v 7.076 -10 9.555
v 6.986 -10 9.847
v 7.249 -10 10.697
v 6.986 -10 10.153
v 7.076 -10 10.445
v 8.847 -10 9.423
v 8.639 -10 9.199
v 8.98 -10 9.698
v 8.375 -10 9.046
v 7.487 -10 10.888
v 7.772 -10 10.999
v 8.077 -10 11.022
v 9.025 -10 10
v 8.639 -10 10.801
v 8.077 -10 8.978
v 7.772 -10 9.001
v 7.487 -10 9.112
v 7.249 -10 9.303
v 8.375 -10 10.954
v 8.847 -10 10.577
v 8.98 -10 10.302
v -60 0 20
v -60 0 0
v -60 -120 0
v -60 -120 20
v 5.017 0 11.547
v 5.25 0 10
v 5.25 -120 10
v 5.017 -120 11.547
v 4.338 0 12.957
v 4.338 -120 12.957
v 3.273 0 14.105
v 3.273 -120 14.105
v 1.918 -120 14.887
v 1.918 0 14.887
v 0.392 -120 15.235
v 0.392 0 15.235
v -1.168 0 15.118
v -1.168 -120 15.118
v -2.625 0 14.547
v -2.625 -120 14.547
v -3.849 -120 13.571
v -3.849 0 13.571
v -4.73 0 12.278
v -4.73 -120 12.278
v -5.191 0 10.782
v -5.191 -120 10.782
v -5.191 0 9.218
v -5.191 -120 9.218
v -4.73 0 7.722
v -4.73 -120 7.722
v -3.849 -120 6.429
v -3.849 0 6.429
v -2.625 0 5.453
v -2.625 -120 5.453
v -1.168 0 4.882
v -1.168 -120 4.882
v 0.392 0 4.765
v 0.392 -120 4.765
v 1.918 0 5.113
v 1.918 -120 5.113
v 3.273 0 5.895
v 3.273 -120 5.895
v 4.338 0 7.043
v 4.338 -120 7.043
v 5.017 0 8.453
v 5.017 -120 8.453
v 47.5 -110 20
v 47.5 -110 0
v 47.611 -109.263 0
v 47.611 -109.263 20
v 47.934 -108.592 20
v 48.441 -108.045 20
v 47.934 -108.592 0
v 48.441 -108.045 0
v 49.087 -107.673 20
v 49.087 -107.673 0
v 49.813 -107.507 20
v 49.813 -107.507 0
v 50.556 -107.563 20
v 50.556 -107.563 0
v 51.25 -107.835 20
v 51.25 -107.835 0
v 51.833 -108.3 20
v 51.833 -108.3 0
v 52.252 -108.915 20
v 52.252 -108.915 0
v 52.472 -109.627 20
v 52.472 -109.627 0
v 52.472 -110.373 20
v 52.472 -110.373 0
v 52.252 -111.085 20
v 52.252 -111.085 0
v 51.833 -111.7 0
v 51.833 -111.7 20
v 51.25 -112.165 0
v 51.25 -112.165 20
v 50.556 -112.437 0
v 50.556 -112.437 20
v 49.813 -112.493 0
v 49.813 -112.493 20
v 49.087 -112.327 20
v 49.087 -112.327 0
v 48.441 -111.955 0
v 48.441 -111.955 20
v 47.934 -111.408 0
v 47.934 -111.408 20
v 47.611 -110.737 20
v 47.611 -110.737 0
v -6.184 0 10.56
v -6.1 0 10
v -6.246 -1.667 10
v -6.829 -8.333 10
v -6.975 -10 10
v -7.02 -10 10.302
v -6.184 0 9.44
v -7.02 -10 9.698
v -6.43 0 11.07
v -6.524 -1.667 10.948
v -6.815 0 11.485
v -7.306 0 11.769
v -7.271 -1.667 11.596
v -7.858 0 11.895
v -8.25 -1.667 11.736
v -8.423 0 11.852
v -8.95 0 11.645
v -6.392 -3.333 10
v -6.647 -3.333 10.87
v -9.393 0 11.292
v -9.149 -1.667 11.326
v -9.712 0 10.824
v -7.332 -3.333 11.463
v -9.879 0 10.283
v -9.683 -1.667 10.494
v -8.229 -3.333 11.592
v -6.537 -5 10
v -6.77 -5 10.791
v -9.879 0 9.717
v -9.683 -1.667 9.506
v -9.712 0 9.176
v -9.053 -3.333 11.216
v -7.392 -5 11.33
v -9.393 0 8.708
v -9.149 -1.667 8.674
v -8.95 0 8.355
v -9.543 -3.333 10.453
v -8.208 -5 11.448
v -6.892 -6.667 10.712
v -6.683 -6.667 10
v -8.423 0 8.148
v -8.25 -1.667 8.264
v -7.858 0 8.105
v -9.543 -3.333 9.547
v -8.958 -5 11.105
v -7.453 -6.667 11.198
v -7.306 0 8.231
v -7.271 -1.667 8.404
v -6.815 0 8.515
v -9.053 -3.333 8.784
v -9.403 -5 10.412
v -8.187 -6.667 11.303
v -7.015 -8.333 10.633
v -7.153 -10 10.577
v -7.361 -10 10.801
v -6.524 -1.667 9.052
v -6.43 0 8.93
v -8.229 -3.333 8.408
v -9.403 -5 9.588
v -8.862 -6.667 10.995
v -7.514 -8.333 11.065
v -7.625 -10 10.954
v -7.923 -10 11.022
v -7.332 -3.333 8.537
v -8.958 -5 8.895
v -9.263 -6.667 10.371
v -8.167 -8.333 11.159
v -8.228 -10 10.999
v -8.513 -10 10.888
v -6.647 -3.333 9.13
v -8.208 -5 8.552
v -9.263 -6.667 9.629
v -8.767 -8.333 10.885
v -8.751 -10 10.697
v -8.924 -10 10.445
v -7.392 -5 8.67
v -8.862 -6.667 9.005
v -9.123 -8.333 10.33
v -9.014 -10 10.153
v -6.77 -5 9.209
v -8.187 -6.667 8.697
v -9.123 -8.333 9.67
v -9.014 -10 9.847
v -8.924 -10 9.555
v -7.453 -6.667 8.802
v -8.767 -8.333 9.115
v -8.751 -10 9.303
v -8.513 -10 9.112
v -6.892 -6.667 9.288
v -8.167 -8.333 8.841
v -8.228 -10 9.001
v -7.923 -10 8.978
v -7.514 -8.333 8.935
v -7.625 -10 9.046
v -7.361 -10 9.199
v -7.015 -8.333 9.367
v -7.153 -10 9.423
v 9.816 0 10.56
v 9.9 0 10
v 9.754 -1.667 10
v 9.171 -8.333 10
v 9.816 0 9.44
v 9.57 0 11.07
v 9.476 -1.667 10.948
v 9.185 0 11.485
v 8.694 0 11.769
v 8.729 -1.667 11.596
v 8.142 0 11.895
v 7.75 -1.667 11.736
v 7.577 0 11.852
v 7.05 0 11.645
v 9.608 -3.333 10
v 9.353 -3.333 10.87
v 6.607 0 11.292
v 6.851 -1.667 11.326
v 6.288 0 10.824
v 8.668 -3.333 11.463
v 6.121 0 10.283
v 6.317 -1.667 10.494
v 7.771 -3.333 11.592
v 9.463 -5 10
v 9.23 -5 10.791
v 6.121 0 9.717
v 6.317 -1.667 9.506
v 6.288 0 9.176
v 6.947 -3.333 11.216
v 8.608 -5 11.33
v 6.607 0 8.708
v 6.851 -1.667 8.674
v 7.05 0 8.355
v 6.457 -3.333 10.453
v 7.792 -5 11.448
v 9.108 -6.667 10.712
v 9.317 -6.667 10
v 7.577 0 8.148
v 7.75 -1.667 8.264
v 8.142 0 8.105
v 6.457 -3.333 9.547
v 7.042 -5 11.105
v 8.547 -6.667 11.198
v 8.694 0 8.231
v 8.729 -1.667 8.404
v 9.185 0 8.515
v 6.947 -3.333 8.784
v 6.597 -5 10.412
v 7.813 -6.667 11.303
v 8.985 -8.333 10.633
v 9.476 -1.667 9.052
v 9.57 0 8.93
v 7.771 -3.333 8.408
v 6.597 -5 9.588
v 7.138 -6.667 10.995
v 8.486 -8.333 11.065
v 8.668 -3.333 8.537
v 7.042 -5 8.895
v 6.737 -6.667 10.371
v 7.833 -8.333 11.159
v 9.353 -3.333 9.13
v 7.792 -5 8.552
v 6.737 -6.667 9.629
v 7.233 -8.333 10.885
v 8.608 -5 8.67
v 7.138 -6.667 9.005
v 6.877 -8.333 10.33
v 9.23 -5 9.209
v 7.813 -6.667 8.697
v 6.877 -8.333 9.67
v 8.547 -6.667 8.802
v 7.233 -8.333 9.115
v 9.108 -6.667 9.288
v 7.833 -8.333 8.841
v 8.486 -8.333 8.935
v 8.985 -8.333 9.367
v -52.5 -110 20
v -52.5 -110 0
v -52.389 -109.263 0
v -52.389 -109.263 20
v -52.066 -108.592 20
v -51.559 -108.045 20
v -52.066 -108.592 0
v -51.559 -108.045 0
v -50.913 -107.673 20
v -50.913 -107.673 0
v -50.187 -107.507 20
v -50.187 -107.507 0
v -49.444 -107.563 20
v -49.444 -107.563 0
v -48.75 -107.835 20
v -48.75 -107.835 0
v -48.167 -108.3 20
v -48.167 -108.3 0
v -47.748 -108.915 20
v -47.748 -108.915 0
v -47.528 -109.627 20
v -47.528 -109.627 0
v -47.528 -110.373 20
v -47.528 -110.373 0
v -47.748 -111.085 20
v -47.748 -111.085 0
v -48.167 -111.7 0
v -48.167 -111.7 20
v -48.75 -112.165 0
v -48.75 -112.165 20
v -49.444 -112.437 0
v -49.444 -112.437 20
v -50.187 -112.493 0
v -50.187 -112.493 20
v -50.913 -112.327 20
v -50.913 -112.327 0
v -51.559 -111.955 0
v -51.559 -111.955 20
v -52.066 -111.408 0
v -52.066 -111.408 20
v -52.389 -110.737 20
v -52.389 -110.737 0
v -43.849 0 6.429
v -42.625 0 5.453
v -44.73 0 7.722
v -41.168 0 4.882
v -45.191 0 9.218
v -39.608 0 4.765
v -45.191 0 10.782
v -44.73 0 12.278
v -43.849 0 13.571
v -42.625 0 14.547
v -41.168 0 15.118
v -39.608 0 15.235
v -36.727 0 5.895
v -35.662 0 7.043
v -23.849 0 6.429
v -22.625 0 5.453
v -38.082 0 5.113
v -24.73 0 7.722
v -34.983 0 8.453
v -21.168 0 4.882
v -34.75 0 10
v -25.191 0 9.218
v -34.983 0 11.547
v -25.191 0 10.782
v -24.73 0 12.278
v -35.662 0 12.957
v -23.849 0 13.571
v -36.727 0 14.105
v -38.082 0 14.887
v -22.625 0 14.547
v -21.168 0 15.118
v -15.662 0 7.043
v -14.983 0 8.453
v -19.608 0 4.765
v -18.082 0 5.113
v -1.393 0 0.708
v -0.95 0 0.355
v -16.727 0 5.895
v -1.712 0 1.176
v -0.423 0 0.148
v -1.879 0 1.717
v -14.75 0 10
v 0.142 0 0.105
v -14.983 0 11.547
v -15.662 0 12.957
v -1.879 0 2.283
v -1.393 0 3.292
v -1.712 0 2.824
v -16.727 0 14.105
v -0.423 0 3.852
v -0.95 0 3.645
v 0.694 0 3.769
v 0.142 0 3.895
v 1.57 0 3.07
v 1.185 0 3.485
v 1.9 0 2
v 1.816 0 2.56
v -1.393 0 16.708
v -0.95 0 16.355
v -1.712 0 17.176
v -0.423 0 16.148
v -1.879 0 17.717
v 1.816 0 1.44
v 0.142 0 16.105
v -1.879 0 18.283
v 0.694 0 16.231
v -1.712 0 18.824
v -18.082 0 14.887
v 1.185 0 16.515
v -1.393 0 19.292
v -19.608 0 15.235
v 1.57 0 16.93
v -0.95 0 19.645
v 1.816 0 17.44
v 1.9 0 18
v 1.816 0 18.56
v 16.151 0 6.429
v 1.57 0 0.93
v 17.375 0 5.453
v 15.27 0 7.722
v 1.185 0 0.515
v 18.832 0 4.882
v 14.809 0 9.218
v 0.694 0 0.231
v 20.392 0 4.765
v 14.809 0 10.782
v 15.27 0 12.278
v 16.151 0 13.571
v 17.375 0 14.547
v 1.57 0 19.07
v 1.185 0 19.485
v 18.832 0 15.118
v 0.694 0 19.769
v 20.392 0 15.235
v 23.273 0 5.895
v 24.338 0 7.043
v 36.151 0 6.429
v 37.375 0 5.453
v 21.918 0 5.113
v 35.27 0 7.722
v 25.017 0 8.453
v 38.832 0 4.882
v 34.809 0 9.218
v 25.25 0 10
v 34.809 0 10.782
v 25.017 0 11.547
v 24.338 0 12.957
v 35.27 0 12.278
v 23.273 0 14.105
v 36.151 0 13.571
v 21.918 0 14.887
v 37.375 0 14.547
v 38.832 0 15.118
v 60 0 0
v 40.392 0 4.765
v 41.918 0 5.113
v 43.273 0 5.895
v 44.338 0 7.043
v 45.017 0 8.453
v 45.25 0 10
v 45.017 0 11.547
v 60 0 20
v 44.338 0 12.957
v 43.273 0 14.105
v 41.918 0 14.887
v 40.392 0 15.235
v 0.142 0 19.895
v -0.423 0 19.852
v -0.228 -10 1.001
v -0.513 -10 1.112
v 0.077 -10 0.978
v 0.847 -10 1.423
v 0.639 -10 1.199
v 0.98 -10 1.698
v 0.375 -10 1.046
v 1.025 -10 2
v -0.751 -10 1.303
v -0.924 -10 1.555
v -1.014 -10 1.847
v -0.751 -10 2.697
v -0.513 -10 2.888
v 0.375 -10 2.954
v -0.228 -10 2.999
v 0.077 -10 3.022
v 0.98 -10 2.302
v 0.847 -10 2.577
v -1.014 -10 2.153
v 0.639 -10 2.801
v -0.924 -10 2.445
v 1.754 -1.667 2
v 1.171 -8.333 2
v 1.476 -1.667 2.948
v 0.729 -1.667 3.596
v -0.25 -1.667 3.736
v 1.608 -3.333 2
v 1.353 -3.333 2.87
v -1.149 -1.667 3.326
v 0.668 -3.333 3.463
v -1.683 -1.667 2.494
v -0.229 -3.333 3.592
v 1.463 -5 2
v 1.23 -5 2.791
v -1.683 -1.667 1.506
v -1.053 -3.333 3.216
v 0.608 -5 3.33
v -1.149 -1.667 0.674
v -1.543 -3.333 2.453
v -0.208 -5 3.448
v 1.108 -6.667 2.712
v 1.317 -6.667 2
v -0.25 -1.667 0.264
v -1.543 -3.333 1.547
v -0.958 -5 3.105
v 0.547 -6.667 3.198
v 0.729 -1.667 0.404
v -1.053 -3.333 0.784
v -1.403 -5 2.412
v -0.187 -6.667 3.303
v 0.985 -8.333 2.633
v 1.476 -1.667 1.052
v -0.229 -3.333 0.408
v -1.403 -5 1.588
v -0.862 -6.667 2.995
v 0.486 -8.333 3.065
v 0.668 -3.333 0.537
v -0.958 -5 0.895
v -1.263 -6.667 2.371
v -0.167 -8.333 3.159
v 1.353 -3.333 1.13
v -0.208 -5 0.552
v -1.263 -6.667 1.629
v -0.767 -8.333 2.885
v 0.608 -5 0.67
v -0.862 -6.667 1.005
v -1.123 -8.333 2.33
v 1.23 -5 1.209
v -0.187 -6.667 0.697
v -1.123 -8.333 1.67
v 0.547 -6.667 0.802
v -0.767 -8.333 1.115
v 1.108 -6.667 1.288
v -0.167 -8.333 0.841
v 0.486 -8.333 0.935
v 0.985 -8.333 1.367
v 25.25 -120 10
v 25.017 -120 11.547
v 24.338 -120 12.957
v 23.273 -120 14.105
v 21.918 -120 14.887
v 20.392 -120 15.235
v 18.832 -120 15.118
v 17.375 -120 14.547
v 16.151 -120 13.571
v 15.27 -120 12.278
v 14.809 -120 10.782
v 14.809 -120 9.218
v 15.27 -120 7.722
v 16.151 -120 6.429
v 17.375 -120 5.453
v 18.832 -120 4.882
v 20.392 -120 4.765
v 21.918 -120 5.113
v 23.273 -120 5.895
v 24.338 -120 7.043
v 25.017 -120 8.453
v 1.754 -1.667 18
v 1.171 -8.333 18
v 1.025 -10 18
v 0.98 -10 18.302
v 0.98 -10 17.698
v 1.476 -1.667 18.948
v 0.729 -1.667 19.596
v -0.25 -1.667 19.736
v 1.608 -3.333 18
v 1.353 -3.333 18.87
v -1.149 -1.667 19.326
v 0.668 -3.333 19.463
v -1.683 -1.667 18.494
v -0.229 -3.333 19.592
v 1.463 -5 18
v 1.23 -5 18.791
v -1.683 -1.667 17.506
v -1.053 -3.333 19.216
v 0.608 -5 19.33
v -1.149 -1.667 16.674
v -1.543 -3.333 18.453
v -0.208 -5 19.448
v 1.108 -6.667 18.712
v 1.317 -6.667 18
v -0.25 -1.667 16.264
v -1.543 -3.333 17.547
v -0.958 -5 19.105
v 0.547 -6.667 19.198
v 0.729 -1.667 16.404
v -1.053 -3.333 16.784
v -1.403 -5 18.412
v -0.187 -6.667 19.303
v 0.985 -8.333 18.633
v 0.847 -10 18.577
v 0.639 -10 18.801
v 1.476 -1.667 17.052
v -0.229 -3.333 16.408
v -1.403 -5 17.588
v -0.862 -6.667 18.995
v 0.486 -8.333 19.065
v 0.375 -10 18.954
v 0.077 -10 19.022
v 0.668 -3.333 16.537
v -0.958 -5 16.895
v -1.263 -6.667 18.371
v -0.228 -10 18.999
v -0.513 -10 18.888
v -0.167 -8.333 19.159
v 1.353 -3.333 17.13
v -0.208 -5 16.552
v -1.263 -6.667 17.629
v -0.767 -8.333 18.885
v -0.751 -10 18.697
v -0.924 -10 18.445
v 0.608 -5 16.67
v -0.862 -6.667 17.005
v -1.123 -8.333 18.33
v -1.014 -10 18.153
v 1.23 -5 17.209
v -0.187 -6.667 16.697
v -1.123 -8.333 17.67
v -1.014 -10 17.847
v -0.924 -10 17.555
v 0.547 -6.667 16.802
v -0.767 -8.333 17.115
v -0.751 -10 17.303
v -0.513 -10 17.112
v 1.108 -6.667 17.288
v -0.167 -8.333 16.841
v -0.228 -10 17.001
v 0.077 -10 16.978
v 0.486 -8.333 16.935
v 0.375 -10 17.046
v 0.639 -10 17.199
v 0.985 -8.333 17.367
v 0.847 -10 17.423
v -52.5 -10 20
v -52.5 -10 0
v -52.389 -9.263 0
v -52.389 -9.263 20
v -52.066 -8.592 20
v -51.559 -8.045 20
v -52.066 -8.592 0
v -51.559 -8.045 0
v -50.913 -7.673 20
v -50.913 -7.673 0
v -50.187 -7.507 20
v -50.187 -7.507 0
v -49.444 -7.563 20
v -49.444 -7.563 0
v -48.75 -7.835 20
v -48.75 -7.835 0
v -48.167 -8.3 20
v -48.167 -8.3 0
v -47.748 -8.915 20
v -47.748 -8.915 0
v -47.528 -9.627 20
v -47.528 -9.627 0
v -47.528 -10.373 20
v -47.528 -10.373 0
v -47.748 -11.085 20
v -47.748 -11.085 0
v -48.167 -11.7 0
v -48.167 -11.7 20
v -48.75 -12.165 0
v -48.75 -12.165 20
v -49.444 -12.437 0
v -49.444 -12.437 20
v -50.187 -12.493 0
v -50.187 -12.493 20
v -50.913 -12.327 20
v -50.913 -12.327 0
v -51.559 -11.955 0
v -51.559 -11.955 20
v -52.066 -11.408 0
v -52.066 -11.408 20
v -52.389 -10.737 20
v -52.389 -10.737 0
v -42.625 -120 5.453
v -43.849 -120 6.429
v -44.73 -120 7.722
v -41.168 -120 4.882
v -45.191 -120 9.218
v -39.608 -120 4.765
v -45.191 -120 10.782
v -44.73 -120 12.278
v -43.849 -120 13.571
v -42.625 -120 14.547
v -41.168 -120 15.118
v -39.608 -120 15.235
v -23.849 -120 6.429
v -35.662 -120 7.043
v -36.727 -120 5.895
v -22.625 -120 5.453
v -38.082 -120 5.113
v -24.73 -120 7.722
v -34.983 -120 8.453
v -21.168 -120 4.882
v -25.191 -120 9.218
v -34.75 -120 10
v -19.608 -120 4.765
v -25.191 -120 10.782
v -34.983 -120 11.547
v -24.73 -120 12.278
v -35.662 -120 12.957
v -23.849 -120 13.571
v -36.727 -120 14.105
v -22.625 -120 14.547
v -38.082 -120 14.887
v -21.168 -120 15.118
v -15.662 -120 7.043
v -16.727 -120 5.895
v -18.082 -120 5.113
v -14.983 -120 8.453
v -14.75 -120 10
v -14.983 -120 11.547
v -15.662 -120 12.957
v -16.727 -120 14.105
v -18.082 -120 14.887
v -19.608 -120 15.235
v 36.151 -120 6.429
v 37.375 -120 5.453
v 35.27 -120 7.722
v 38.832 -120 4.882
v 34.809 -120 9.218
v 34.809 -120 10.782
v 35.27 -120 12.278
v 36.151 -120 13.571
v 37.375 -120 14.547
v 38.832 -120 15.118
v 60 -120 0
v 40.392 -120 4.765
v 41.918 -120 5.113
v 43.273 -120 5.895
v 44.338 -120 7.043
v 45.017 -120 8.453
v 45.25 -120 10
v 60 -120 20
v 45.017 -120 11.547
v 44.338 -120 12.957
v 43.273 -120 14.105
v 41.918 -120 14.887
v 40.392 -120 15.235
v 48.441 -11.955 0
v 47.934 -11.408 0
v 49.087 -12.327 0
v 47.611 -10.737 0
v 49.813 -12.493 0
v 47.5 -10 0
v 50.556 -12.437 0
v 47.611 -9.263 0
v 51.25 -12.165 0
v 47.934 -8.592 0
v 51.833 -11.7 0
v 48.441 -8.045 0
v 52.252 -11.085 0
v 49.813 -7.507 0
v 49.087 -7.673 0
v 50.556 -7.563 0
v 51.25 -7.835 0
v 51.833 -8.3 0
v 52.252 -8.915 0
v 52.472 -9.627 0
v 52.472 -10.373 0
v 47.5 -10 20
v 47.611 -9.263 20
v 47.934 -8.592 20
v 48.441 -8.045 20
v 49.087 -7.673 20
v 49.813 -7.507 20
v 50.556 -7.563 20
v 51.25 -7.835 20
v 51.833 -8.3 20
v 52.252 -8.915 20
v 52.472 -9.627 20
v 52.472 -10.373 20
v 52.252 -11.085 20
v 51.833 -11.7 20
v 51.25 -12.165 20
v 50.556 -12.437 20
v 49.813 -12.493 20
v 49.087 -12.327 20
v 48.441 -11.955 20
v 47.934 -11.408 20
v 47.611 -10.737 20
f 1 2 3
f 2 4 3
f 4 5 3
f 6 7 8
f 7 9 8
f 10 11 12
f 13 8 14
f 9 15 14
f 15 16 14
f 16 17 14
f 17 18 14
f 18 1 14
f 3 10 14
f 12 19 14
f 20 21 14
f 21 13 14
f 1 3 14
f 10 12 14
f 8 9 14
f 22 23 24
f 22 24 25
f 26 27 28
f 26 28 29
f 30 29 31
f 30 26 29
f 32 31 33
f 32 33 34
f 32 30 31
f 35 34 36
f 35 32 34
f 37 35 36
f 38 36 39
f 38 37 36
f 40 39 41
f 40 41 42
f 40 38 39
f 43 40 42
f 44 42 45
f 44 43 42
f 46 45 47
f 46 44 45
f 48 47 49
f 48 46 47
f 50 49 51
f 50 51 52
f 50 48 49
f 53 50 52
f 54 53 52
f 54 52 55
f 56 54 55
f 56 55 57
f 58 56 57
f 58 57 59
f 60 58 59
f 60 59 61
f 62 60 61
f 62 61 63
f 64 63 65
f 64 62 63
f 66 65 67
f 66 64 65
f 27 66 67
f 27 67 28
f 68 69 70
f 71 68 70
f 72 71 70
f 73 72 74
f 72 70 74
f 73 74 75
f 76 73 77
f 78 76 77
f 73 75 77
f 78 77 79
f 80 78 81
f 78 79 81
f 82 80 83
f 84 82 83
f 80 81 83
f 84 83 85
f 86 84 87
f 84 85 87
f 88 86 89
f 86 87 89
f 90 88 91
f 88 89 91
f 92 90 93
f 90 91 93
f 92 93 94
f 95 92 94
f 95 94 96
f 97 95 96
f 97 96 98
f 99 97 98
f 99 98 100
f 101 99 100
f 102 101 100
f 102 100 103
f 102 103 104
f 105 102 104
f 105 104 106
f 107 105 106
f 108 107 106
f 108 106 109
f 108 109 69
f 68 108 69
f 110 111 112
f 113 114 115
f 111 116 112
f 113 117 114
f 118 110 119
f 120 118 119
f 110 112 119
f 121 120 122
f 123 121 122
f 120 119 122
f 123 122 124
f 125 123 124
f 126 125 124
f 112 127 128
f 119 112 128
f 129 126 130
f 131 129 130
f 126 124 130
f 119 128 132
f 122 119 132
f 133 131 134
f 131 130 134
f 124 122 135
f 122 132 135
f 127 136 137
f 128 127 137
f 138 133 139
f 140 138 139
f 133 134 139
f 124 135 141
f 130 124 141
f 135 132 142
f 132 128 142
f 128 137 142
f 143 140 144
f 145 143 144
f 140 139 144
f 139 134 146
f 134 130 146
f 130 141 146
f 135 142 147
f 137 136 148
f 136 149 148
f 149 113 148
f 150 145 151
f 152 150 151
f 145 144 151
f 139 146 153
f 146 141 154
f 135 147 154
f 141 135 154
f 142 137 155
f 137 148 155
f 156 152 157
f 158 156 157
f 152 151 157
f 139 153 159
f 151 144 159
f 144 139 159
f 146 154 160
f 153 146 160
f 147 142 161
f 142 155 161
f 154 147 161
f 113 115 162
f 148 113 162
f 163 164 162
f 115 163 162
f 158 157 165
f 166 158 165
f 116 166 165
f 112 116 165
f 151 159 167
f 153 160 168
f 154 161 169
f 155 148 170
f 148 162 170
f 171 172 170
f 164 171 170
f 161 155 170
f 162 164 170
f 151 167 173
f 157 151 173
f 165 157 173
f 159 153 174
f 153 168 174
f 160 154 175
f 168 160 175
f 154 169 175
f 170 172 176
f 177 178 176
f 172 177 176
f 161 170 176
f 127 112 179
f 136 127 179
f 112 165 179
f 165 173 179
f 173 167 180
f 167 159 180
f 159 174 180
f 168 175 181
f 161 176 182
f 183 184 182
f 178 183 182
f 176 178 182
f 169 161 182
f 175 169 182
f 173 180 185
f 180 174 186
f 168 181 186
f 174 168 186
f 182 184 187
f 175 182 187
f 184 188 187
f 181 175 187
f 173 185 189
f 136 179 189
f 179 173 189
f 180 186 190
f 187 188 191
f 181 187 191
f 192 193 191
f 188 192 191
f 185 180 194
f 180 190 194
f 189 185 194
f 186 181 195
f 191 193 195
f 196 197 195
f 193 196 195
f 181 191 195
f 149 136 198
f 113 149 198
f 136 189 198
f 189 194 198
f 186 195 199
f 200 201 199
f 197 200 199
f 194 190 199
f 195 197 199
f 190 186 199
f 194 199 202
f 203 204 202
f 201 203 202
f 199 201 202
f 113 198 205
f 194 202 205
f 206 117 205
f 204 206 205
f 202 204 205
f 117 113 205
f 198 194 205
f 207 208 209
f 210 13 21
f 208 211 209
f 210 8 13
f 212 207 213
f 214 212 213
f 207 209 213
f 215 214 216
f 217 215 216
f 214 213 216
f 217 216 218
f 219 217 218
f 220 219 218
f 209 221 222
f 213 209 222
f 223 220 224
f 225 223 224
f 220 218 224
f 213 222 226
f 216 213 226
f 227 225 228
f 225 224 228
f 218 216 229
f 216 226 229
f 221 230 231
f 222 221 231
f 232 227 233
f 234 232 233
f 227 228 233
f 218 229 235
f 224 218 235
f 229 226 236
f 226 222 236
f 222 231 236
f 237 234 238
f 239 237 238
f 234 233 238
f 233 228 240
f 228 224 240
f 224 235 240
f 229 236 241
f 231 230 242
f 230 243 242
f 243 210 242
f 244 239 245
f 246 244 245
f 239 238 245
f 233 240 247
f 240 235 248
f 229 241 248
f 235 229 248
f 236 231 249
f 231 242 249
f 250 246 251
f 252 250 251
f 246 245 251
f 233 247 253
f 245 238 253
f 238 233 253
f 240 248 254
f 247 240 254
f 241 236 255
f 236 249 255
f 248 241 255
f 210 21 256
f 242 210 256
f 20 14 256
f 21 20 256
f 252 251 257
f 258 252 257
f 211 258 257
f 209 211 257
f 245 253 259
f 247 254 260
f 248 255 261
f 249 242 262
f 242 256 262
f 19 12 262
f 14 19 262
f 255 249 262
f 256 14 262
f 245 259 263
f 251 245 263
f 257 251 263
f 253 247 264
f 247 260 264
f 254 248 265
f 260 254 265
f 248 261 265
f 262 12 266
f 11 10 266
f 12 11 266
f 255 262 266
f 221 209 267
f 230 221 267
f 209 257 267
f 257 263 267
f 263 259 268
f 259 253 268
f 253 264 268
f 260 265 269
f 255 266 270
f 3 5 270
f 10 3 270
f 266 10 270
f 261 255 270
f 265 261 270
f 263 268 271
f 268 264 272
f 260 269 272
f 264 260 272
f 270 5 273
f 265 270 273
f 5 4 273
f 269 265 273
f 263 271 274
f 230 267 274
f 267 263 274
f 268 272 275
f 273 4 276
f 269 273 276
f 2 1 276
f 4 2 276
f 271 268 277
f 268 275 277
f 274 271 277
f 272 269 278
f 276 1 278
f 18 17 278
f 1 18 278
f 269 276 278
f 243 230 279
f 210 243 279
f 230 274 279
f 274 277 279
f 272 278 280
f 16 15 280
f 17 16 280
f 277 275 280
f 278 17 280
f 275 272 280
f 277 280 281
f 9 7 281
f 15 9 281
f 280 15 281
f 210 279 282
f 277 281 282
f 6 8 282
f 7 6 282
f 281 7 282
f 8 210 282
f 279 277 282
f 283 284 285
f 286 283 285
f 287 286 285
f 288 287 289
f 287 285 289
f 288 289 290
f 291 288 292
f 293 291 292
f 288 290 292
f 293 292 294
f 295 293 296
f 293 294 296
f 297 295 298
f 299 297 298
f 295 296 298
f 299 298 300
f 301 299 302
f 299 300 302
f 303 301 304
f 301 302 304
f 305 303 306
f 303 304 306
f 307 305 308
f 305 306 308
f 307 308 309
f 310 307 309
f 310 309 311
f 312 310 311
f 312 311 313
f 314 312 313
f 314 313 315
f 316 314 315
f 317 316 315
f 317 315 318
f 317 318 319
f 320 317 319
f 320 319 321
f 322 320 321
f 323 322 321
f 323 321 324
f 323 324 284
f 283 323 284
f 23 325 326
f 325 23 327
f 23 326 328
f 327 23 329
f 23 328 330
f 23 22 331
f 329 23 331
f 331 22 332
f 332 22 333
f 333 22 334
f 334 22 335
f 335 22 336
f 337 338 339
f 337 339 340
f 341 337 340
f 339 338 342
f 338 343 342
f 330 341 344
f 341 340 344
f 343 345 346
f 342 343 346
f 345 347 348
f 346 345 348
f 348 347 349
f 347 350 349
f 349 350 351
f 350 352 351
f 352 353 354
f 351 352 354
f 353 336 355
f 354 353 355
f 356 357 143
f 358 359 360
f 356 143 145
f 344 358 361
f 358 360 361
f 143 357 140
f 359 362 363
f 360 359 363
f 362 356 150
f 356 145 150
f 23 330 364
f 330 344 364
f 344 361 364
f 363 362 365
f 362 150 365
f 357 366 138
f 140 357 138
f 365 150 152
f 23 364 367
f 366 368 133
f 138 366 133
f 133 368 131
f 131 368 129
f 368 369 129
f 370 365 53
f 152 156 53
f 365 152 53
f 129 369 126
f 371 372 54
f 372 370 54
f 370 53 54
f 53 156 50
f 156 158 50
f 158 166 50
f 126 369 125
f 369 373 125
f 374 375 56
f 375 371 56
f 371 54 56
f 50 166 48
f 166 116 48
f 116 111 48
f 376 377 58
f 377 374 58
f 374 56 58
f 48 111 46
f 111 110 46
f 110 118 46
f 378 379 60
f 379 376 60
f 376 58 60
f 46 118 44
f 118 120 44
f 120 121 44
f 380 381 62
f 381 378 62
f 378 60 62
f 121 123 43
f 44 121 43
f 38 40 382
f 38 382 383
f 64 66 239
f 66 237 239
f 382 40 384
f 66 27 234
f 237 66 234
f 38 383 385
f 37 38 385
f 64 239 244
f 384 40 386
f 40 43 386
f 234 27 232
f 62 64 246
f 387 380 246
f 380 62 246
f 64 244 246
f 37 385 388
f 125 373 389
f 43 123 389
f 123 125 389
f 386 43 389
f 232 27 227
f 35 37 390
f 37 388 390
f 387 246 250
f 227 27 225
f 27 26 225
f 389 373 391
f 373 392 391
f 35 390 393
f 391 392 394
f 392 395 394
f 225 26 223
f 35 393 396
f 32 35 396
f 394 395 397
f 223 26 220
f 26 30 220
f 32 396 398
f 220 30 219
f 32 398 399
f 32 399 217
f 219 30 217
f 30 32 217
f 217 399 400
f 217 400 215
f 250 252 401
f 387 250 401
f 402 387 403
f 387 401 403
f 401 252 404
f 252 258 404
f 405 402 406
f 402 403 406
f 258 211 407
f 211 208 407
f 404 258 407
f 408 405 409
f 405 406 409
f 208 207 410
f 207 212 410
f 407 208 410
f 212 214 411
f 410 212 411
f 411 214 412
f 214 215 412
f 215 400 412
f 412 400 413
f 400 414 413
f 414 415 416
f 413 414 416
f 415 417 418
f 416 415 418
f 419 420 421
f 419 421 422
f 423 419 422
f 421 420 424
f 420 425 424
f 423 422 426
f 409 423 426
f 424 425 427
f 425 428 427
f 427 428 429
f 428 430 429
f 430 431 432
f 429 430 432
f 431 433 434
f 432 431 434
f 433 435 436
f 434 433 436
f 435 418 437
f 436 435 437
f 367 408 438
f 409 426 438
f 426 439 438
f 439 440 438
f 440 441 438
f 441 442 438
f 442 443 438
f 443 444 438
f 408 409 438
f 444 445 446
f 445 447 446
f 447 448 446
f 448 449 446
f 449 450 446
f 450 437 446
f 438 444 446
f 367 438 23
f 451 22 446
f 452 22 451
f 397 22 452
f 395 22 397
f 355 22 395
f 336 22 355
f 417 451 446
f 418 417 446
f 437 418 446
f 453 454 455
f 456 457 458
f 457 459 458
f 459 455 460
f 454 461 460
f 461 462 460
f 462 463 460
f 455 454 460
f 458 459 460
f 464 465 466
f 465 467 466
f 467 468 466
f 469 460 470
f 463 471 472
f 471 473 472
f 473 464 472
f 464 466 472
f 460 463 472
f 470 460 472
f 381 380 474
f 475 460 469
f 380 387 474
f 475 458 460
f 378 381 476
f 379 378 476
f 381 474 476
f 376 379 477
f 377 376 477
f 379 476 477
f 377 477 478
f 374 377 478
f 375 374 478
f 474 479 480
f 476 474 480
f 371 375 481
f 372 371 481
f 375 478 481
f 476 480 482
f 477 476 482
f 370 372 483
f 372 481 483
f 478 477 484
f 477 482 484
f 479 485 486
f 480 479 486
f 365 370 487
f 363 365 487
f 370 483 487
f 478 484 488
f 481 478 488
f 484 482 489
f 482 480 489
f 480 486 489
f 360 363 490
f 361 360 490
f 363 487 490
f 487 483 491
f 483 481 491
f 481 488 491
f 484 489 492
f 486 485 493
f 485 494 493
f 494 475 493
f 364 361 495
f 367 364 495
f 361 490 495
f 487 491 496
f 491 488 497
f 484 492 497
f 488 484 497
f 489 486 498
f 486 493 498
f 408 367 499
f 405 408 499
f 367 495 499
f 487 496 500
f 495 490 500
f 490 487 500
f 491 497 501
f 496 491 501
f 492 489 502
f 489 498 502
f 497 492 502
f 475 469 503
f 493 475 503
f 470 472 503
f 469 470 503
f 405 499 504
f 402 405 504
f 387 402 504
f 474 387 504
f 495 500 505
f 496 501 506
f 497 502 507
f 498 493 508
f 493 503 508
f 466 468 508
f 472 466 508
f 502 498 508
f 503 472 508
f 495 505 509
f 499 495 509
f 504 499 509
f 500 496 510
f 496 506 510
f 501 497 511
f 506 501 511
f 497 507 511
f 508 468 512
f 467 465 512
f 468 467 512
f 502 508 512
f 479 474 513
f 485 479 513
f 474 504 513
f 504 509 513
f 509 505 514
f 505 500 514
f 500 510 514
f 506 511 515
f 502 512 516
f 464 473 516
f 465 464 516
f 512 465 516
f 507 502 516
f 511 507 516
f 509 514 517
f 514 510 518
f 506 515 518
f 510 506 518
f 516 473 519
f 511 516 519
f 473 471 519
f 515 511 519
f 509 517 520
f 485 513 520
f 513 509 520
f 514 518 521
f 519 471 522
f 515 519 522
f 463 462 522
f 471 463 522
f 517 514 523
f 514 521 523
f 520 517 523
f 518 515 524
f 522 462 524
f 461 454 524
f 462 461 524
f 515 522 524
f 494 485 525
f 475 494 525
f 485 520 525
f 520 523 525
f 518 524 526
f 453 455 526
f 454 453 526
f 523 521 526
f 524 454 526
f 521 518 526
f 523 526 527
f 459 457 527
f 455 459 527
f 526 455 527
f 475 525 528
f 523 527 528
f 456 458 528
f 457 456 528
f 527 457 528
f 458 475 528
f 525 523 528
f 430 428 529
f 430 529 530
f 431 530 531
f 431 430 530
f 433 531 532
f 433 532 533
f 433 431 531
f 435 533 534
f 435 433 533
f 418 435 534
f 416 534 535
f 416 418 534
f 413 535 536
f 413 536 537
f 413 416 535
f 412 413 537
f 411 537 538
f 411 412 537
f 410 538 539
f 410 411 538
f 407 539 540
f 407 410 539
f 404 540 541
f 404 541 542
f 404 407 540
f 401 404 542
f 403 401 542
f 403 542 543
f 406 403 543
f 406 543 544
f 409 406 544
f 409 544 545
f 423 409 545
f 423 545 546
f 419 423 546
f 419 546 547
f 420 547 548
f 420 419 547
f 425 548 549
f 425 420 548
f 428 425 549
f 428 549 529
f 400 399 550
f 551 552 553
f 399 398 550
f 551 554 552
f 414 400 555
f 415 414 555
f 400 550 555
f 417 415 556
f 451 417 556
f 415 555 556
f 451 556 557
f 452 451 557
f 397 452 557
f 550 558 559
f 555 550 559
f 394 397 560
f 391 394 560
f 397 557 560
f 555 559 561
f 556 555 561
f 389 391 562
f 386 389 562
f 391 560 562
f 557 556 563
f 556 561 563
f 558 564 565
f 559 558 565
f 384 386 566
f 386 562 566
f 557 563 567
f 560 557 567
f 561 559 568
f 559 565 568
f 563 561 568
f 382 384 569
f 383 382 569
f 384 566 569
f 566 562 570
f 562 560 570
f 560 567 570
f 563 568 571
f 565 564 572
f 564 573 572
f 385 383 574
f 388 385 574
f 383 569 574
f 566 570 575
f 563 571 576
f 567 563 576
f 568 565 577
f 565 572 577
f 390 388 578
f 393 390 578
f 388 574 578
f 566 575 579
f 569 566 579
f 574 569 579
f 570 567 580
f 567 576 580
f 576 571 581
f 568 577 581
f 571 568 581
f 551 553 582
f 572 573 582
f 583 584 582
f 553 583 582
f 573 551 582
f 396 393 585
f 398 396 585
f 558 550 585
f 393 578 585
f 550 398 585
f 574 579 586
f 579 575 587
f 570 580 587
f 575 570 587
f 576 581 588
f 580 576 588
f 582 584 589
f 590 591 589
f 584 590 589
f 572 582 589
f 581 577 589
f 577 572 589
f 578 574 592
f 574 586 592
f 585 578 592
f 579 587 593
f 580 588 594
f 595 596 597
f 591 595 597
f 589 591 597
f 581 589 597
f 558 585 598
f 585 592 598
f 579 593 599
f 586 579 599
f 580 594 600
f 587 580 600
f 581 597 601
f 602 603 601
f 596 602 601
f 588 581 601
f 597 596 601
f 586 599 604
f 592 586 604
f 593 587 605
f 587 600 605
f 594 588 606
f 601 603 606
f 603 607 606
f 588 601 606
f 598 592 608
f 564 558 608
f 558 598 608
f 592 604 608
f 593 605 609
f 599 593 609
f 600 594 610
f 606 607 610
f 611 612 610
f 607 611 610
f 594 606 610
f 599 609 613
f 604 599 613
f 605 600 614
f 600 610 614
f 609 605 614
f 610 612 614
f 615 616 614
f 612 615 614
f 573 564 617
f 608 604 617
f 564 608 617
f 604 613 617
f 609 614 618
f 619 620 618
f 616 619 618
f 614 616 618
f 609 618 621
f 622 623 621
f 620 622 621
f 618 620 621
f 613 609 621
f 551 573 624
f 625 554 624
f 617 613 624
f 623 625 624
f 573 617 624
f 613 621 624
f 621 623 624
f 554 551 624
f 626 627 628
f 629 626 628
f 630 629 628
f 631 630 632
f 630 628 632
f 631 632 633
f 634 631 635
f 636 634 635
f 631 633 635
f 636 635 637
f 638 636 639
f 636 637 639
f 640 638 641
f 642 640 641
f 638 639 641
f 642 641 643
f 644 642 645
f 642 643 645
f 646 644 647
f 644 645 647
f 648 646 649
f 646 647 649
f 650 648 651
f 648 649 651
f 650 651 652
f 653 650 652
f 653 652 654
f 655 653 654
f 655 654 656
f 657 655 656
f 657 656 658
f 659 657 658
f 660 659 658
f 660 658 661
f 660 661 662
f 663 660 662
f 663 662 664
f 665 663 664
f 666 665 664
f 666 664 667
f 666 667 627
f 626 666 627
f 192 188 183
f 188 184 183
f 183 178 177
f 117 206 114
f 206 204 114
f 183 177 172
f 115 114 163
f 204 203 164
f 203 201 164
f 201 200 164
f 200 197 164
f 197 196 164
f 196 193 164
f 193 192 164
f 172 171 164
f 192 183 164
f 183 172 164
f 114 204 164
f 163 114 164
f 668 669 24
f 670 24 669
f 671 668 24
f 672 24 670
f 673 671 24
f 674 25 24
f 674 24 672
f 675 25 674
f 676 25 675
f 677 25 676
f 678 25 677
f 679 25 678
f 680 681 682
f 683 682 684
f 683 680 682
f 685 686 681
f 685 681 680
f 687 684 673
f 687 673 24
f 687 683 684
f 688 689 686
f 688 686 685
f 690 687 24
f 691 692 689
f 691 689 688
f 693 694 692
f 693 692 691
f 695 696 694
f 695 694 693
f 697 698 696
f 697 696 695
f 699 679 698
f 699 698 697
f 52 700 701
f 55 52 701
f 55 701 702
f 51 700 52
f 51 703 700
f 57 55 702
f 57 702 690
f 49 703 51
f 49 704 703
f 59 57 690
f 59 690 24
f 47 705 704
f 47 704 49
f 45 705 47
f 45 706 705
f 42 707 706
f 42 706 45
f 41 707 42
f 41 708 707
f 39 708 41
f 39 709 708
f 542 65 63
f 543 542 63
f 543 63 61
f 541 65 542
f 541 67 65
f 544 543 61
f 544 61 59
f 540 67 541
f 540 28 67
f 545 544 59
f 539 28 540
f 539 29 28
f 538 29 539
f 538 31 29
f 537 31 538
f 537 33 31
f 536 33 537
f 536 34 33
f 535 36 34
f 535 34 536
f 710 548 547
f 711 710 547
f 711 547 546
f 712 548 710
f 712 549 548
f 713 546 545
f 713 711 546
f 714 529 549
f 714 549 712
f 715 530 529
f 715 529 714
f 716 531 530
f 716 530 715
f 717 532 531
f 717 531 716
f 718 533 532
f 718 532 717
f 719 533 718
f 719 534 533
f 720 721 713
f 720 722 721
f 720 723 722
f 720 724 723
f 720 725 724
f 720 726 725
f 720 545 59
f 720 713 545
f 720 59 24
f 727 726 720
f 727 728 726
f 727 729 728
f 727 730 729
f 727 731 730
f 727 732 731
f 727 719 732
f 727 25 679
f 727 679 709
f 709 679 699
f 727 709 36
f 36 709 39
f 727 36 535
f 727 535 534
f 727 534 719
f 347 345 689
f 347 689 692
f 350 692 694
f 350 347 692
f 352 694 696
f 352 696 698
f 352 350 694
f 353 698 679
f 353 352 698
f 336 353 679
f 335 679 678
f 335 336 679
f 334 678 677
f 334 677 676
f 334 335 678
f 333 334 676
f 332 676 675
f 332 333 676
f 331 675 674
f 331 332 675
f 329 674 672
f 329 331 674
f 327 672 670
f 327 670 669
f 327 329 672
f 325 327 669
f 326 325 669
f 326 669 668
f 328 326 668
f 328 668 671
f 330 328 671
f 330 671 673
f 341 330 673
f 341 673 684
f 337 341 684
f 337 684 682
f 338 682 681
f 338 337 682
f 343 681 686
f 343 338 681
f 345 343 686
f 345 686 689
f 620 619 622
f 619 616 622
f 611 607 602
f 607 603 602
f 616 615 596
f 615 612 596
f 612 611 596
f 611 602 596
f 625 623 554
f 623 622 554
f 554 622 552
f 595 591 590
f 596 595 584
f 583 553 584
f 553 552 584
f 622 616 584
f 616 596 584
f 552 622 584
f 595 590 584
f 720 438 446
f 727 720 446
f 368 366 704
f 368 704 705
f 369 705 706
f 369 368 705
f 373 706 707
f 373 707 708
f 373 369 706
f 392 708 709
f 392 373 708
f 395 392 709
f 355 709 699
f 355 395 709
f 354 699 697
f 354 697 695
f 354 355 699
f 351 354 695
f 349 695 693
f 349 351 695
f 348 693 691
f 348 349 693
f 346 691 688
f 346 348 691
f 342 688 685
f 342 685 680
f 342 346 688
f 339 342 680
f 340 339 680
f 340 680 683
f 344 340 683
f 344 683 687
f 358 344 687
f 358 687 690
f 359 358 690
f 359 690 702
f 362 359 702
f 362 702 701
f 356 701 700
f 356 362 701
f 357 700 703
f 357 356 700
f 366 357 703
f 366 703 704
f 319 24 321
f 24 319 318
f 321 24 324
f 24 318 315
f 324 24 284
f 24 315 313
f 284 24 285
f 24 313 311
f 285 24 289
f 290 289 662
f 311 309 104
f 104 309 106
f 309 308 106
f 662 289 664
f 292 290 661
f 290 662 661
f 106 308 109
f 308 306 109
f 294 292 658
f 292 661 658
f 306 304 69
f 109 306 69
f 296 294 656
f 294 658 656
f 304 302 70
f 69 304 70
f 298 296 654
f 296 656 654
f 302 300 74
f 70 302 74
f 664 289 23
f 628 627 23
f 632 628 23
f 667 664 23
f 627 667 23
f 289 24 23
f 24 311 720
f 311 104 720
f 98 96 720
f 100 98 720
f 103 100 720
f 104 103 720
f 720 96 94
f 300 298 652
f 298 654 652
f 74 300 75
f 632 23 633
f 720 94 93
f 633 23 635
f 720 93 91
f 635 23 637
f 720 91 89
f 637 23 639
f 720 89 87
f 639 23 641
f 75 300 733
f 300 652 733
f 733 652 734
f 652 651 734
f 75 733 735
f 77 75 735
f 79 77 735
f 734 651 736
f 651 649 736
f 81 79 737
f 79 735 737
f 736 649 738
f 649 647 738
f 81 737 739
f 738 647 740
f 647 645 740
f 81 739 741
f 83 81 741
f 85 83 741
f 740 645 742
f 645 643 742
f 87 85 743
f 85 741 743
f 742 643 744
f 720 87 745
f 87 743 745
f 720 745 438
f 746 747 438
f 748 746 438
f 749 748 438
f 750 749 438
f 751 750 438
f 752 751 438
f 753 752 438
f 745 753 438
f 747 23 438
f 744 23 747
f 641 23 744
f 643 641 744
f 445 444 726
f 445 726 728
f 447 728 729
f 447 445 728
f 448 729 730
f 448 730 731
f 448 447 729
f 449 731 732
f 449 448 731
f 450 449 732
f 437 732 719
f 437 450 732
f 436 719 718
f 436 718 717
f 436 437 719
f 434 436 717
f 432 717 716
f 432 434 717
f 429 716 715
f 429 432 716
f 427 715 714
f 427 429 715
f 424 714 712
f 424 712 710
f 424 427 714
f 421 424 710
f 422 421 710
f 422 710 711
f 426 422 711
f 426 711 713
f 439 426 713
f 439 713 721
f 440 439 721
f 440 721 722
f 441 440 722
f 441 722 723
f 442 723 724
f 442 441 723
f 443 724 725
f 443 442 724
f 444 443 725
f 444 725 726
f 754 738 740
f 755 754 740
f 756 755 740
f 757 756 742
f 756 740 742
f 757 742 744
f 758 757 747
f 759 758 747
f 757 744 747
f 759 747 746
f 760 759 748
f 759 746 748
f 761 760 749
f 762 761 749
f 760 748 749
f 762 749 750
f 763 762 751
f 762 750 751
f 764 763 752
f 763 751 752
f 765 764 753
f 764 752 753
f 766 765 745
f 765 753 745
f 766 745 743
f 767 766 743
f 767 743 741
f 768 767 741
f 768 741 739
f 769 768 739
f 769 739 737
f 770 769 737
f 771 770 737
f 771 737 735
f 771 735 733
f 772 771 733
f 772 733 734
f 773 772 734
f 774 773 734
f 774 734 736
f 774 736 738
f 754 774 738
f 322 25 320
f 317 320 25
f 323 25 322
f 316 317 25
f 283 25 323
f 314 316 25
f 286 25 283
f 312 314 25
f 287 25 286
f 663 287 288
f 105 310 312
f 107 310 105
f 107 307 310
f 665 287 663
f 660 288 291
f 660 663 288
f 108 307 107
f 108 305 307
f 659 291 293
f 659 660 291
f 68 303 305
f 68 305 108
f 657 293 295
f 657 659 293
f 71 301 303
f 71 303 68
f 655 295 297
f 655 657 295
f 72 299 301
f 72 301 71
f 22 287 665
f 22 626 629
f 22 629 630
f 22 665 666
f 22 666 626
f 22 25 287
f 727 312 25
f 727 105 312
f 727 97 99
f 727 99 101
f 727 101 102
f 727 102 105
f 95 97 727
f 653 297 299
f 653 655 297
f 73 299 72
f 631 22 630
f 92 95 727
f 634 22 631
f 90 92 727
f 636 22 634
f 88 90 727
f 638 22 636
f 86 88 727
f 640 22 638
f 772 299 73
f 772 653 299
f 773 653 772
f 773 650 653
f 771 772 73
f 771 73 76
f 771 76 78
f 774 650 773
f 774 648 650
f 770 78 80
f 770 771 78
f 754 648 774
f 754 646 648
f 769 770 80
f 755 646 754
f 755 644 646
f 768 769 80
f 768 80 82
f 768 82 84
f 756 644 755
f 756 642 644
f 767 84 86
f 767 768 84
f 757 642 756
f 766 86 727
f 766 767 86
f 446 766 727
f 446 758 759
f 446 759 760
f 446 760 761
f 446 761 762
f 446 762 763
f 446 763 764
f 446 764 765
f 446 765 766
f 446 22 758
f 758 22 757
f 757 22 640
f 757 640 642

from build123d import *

# Parameters (mm, degrees)
F0_W     = 120
F0_H     = 20
F0_R     = 1.9
F0_R_2   = 5.25
F1_DEPTH = 120
F3_D     = 5
F4_DEPTH = 10
F4_TAPER = 5


with BuildPart() as f1:
    # F0 (on Front) → F1 (new body)
    with BuildSketch(Plane.XZ):
        with Locations((0, 10)):
            Rectangle(F0_W, F0_H)
        with Locations((0, 2)):
            Circle(F0_R, mode=Mode.SUBTRACT)
        with Locations((-40, 10)):
            Circle(F0_R_2, mode=Mode.SUBTRACT)
        with Locations((-20, 10)):
            Circle(F0_R_2, mode=Mode.SUBTRACT)
        with Locations((-8, 10)):
            Circle(F0_R, mode=Mode.SUBTRACT)
        with Locations((0, 10)):
            Circle(F0_R_2, mode=Mode.SUBTRACT)
        with Locations((8, 10)):
            Circle(F0_R, mode=Mode.SUBTRACT)
        with Locations((20, 10)):
            Circle(F0_R_2, mode=Mode.SUBTRACT)
        with Locations((40, 10)):
            Circle(F0_R_2, mode=Mode.SUBTRACT)
        with Locations((0, 18)):
            Circle(F0_R, mode=Mode.SUBTRACT)
        with Locations((8, 10)):
            Circle(F0_R)
        with Locations((0, 18)):
            Circle(F0_R)
        with Locations((-8, 10)):
            Circle(F0_R)
        with Locations((0, 2)):
            Circle(F0_R)
    extrude(amount=F1_DEPTH)

    # F3 (through all)
    with Locations(Plane.XY.offset(20)):
        with Locations((-50, -10), (50, -10), (-50, -110), (50, -110)):
            Hole(F3_D / 2)

    # F0 (on Front) → F4 (cut)
    with BuildSketch(Plane.XZ):
        with Locations((8, 10)):
            Circle(F0_R)
        with Locations((0, 18)):
            Circle(F0_R)
        with Locations((-8, 10)):
            Circle(F0_R)
        with Locations((0, 2)):
            Circle(F0_R)
    extrude(amount=F4_DEPTH, taper=F4_TAPER, mode=Mode.SUBTRACT)


solid = f1.part
